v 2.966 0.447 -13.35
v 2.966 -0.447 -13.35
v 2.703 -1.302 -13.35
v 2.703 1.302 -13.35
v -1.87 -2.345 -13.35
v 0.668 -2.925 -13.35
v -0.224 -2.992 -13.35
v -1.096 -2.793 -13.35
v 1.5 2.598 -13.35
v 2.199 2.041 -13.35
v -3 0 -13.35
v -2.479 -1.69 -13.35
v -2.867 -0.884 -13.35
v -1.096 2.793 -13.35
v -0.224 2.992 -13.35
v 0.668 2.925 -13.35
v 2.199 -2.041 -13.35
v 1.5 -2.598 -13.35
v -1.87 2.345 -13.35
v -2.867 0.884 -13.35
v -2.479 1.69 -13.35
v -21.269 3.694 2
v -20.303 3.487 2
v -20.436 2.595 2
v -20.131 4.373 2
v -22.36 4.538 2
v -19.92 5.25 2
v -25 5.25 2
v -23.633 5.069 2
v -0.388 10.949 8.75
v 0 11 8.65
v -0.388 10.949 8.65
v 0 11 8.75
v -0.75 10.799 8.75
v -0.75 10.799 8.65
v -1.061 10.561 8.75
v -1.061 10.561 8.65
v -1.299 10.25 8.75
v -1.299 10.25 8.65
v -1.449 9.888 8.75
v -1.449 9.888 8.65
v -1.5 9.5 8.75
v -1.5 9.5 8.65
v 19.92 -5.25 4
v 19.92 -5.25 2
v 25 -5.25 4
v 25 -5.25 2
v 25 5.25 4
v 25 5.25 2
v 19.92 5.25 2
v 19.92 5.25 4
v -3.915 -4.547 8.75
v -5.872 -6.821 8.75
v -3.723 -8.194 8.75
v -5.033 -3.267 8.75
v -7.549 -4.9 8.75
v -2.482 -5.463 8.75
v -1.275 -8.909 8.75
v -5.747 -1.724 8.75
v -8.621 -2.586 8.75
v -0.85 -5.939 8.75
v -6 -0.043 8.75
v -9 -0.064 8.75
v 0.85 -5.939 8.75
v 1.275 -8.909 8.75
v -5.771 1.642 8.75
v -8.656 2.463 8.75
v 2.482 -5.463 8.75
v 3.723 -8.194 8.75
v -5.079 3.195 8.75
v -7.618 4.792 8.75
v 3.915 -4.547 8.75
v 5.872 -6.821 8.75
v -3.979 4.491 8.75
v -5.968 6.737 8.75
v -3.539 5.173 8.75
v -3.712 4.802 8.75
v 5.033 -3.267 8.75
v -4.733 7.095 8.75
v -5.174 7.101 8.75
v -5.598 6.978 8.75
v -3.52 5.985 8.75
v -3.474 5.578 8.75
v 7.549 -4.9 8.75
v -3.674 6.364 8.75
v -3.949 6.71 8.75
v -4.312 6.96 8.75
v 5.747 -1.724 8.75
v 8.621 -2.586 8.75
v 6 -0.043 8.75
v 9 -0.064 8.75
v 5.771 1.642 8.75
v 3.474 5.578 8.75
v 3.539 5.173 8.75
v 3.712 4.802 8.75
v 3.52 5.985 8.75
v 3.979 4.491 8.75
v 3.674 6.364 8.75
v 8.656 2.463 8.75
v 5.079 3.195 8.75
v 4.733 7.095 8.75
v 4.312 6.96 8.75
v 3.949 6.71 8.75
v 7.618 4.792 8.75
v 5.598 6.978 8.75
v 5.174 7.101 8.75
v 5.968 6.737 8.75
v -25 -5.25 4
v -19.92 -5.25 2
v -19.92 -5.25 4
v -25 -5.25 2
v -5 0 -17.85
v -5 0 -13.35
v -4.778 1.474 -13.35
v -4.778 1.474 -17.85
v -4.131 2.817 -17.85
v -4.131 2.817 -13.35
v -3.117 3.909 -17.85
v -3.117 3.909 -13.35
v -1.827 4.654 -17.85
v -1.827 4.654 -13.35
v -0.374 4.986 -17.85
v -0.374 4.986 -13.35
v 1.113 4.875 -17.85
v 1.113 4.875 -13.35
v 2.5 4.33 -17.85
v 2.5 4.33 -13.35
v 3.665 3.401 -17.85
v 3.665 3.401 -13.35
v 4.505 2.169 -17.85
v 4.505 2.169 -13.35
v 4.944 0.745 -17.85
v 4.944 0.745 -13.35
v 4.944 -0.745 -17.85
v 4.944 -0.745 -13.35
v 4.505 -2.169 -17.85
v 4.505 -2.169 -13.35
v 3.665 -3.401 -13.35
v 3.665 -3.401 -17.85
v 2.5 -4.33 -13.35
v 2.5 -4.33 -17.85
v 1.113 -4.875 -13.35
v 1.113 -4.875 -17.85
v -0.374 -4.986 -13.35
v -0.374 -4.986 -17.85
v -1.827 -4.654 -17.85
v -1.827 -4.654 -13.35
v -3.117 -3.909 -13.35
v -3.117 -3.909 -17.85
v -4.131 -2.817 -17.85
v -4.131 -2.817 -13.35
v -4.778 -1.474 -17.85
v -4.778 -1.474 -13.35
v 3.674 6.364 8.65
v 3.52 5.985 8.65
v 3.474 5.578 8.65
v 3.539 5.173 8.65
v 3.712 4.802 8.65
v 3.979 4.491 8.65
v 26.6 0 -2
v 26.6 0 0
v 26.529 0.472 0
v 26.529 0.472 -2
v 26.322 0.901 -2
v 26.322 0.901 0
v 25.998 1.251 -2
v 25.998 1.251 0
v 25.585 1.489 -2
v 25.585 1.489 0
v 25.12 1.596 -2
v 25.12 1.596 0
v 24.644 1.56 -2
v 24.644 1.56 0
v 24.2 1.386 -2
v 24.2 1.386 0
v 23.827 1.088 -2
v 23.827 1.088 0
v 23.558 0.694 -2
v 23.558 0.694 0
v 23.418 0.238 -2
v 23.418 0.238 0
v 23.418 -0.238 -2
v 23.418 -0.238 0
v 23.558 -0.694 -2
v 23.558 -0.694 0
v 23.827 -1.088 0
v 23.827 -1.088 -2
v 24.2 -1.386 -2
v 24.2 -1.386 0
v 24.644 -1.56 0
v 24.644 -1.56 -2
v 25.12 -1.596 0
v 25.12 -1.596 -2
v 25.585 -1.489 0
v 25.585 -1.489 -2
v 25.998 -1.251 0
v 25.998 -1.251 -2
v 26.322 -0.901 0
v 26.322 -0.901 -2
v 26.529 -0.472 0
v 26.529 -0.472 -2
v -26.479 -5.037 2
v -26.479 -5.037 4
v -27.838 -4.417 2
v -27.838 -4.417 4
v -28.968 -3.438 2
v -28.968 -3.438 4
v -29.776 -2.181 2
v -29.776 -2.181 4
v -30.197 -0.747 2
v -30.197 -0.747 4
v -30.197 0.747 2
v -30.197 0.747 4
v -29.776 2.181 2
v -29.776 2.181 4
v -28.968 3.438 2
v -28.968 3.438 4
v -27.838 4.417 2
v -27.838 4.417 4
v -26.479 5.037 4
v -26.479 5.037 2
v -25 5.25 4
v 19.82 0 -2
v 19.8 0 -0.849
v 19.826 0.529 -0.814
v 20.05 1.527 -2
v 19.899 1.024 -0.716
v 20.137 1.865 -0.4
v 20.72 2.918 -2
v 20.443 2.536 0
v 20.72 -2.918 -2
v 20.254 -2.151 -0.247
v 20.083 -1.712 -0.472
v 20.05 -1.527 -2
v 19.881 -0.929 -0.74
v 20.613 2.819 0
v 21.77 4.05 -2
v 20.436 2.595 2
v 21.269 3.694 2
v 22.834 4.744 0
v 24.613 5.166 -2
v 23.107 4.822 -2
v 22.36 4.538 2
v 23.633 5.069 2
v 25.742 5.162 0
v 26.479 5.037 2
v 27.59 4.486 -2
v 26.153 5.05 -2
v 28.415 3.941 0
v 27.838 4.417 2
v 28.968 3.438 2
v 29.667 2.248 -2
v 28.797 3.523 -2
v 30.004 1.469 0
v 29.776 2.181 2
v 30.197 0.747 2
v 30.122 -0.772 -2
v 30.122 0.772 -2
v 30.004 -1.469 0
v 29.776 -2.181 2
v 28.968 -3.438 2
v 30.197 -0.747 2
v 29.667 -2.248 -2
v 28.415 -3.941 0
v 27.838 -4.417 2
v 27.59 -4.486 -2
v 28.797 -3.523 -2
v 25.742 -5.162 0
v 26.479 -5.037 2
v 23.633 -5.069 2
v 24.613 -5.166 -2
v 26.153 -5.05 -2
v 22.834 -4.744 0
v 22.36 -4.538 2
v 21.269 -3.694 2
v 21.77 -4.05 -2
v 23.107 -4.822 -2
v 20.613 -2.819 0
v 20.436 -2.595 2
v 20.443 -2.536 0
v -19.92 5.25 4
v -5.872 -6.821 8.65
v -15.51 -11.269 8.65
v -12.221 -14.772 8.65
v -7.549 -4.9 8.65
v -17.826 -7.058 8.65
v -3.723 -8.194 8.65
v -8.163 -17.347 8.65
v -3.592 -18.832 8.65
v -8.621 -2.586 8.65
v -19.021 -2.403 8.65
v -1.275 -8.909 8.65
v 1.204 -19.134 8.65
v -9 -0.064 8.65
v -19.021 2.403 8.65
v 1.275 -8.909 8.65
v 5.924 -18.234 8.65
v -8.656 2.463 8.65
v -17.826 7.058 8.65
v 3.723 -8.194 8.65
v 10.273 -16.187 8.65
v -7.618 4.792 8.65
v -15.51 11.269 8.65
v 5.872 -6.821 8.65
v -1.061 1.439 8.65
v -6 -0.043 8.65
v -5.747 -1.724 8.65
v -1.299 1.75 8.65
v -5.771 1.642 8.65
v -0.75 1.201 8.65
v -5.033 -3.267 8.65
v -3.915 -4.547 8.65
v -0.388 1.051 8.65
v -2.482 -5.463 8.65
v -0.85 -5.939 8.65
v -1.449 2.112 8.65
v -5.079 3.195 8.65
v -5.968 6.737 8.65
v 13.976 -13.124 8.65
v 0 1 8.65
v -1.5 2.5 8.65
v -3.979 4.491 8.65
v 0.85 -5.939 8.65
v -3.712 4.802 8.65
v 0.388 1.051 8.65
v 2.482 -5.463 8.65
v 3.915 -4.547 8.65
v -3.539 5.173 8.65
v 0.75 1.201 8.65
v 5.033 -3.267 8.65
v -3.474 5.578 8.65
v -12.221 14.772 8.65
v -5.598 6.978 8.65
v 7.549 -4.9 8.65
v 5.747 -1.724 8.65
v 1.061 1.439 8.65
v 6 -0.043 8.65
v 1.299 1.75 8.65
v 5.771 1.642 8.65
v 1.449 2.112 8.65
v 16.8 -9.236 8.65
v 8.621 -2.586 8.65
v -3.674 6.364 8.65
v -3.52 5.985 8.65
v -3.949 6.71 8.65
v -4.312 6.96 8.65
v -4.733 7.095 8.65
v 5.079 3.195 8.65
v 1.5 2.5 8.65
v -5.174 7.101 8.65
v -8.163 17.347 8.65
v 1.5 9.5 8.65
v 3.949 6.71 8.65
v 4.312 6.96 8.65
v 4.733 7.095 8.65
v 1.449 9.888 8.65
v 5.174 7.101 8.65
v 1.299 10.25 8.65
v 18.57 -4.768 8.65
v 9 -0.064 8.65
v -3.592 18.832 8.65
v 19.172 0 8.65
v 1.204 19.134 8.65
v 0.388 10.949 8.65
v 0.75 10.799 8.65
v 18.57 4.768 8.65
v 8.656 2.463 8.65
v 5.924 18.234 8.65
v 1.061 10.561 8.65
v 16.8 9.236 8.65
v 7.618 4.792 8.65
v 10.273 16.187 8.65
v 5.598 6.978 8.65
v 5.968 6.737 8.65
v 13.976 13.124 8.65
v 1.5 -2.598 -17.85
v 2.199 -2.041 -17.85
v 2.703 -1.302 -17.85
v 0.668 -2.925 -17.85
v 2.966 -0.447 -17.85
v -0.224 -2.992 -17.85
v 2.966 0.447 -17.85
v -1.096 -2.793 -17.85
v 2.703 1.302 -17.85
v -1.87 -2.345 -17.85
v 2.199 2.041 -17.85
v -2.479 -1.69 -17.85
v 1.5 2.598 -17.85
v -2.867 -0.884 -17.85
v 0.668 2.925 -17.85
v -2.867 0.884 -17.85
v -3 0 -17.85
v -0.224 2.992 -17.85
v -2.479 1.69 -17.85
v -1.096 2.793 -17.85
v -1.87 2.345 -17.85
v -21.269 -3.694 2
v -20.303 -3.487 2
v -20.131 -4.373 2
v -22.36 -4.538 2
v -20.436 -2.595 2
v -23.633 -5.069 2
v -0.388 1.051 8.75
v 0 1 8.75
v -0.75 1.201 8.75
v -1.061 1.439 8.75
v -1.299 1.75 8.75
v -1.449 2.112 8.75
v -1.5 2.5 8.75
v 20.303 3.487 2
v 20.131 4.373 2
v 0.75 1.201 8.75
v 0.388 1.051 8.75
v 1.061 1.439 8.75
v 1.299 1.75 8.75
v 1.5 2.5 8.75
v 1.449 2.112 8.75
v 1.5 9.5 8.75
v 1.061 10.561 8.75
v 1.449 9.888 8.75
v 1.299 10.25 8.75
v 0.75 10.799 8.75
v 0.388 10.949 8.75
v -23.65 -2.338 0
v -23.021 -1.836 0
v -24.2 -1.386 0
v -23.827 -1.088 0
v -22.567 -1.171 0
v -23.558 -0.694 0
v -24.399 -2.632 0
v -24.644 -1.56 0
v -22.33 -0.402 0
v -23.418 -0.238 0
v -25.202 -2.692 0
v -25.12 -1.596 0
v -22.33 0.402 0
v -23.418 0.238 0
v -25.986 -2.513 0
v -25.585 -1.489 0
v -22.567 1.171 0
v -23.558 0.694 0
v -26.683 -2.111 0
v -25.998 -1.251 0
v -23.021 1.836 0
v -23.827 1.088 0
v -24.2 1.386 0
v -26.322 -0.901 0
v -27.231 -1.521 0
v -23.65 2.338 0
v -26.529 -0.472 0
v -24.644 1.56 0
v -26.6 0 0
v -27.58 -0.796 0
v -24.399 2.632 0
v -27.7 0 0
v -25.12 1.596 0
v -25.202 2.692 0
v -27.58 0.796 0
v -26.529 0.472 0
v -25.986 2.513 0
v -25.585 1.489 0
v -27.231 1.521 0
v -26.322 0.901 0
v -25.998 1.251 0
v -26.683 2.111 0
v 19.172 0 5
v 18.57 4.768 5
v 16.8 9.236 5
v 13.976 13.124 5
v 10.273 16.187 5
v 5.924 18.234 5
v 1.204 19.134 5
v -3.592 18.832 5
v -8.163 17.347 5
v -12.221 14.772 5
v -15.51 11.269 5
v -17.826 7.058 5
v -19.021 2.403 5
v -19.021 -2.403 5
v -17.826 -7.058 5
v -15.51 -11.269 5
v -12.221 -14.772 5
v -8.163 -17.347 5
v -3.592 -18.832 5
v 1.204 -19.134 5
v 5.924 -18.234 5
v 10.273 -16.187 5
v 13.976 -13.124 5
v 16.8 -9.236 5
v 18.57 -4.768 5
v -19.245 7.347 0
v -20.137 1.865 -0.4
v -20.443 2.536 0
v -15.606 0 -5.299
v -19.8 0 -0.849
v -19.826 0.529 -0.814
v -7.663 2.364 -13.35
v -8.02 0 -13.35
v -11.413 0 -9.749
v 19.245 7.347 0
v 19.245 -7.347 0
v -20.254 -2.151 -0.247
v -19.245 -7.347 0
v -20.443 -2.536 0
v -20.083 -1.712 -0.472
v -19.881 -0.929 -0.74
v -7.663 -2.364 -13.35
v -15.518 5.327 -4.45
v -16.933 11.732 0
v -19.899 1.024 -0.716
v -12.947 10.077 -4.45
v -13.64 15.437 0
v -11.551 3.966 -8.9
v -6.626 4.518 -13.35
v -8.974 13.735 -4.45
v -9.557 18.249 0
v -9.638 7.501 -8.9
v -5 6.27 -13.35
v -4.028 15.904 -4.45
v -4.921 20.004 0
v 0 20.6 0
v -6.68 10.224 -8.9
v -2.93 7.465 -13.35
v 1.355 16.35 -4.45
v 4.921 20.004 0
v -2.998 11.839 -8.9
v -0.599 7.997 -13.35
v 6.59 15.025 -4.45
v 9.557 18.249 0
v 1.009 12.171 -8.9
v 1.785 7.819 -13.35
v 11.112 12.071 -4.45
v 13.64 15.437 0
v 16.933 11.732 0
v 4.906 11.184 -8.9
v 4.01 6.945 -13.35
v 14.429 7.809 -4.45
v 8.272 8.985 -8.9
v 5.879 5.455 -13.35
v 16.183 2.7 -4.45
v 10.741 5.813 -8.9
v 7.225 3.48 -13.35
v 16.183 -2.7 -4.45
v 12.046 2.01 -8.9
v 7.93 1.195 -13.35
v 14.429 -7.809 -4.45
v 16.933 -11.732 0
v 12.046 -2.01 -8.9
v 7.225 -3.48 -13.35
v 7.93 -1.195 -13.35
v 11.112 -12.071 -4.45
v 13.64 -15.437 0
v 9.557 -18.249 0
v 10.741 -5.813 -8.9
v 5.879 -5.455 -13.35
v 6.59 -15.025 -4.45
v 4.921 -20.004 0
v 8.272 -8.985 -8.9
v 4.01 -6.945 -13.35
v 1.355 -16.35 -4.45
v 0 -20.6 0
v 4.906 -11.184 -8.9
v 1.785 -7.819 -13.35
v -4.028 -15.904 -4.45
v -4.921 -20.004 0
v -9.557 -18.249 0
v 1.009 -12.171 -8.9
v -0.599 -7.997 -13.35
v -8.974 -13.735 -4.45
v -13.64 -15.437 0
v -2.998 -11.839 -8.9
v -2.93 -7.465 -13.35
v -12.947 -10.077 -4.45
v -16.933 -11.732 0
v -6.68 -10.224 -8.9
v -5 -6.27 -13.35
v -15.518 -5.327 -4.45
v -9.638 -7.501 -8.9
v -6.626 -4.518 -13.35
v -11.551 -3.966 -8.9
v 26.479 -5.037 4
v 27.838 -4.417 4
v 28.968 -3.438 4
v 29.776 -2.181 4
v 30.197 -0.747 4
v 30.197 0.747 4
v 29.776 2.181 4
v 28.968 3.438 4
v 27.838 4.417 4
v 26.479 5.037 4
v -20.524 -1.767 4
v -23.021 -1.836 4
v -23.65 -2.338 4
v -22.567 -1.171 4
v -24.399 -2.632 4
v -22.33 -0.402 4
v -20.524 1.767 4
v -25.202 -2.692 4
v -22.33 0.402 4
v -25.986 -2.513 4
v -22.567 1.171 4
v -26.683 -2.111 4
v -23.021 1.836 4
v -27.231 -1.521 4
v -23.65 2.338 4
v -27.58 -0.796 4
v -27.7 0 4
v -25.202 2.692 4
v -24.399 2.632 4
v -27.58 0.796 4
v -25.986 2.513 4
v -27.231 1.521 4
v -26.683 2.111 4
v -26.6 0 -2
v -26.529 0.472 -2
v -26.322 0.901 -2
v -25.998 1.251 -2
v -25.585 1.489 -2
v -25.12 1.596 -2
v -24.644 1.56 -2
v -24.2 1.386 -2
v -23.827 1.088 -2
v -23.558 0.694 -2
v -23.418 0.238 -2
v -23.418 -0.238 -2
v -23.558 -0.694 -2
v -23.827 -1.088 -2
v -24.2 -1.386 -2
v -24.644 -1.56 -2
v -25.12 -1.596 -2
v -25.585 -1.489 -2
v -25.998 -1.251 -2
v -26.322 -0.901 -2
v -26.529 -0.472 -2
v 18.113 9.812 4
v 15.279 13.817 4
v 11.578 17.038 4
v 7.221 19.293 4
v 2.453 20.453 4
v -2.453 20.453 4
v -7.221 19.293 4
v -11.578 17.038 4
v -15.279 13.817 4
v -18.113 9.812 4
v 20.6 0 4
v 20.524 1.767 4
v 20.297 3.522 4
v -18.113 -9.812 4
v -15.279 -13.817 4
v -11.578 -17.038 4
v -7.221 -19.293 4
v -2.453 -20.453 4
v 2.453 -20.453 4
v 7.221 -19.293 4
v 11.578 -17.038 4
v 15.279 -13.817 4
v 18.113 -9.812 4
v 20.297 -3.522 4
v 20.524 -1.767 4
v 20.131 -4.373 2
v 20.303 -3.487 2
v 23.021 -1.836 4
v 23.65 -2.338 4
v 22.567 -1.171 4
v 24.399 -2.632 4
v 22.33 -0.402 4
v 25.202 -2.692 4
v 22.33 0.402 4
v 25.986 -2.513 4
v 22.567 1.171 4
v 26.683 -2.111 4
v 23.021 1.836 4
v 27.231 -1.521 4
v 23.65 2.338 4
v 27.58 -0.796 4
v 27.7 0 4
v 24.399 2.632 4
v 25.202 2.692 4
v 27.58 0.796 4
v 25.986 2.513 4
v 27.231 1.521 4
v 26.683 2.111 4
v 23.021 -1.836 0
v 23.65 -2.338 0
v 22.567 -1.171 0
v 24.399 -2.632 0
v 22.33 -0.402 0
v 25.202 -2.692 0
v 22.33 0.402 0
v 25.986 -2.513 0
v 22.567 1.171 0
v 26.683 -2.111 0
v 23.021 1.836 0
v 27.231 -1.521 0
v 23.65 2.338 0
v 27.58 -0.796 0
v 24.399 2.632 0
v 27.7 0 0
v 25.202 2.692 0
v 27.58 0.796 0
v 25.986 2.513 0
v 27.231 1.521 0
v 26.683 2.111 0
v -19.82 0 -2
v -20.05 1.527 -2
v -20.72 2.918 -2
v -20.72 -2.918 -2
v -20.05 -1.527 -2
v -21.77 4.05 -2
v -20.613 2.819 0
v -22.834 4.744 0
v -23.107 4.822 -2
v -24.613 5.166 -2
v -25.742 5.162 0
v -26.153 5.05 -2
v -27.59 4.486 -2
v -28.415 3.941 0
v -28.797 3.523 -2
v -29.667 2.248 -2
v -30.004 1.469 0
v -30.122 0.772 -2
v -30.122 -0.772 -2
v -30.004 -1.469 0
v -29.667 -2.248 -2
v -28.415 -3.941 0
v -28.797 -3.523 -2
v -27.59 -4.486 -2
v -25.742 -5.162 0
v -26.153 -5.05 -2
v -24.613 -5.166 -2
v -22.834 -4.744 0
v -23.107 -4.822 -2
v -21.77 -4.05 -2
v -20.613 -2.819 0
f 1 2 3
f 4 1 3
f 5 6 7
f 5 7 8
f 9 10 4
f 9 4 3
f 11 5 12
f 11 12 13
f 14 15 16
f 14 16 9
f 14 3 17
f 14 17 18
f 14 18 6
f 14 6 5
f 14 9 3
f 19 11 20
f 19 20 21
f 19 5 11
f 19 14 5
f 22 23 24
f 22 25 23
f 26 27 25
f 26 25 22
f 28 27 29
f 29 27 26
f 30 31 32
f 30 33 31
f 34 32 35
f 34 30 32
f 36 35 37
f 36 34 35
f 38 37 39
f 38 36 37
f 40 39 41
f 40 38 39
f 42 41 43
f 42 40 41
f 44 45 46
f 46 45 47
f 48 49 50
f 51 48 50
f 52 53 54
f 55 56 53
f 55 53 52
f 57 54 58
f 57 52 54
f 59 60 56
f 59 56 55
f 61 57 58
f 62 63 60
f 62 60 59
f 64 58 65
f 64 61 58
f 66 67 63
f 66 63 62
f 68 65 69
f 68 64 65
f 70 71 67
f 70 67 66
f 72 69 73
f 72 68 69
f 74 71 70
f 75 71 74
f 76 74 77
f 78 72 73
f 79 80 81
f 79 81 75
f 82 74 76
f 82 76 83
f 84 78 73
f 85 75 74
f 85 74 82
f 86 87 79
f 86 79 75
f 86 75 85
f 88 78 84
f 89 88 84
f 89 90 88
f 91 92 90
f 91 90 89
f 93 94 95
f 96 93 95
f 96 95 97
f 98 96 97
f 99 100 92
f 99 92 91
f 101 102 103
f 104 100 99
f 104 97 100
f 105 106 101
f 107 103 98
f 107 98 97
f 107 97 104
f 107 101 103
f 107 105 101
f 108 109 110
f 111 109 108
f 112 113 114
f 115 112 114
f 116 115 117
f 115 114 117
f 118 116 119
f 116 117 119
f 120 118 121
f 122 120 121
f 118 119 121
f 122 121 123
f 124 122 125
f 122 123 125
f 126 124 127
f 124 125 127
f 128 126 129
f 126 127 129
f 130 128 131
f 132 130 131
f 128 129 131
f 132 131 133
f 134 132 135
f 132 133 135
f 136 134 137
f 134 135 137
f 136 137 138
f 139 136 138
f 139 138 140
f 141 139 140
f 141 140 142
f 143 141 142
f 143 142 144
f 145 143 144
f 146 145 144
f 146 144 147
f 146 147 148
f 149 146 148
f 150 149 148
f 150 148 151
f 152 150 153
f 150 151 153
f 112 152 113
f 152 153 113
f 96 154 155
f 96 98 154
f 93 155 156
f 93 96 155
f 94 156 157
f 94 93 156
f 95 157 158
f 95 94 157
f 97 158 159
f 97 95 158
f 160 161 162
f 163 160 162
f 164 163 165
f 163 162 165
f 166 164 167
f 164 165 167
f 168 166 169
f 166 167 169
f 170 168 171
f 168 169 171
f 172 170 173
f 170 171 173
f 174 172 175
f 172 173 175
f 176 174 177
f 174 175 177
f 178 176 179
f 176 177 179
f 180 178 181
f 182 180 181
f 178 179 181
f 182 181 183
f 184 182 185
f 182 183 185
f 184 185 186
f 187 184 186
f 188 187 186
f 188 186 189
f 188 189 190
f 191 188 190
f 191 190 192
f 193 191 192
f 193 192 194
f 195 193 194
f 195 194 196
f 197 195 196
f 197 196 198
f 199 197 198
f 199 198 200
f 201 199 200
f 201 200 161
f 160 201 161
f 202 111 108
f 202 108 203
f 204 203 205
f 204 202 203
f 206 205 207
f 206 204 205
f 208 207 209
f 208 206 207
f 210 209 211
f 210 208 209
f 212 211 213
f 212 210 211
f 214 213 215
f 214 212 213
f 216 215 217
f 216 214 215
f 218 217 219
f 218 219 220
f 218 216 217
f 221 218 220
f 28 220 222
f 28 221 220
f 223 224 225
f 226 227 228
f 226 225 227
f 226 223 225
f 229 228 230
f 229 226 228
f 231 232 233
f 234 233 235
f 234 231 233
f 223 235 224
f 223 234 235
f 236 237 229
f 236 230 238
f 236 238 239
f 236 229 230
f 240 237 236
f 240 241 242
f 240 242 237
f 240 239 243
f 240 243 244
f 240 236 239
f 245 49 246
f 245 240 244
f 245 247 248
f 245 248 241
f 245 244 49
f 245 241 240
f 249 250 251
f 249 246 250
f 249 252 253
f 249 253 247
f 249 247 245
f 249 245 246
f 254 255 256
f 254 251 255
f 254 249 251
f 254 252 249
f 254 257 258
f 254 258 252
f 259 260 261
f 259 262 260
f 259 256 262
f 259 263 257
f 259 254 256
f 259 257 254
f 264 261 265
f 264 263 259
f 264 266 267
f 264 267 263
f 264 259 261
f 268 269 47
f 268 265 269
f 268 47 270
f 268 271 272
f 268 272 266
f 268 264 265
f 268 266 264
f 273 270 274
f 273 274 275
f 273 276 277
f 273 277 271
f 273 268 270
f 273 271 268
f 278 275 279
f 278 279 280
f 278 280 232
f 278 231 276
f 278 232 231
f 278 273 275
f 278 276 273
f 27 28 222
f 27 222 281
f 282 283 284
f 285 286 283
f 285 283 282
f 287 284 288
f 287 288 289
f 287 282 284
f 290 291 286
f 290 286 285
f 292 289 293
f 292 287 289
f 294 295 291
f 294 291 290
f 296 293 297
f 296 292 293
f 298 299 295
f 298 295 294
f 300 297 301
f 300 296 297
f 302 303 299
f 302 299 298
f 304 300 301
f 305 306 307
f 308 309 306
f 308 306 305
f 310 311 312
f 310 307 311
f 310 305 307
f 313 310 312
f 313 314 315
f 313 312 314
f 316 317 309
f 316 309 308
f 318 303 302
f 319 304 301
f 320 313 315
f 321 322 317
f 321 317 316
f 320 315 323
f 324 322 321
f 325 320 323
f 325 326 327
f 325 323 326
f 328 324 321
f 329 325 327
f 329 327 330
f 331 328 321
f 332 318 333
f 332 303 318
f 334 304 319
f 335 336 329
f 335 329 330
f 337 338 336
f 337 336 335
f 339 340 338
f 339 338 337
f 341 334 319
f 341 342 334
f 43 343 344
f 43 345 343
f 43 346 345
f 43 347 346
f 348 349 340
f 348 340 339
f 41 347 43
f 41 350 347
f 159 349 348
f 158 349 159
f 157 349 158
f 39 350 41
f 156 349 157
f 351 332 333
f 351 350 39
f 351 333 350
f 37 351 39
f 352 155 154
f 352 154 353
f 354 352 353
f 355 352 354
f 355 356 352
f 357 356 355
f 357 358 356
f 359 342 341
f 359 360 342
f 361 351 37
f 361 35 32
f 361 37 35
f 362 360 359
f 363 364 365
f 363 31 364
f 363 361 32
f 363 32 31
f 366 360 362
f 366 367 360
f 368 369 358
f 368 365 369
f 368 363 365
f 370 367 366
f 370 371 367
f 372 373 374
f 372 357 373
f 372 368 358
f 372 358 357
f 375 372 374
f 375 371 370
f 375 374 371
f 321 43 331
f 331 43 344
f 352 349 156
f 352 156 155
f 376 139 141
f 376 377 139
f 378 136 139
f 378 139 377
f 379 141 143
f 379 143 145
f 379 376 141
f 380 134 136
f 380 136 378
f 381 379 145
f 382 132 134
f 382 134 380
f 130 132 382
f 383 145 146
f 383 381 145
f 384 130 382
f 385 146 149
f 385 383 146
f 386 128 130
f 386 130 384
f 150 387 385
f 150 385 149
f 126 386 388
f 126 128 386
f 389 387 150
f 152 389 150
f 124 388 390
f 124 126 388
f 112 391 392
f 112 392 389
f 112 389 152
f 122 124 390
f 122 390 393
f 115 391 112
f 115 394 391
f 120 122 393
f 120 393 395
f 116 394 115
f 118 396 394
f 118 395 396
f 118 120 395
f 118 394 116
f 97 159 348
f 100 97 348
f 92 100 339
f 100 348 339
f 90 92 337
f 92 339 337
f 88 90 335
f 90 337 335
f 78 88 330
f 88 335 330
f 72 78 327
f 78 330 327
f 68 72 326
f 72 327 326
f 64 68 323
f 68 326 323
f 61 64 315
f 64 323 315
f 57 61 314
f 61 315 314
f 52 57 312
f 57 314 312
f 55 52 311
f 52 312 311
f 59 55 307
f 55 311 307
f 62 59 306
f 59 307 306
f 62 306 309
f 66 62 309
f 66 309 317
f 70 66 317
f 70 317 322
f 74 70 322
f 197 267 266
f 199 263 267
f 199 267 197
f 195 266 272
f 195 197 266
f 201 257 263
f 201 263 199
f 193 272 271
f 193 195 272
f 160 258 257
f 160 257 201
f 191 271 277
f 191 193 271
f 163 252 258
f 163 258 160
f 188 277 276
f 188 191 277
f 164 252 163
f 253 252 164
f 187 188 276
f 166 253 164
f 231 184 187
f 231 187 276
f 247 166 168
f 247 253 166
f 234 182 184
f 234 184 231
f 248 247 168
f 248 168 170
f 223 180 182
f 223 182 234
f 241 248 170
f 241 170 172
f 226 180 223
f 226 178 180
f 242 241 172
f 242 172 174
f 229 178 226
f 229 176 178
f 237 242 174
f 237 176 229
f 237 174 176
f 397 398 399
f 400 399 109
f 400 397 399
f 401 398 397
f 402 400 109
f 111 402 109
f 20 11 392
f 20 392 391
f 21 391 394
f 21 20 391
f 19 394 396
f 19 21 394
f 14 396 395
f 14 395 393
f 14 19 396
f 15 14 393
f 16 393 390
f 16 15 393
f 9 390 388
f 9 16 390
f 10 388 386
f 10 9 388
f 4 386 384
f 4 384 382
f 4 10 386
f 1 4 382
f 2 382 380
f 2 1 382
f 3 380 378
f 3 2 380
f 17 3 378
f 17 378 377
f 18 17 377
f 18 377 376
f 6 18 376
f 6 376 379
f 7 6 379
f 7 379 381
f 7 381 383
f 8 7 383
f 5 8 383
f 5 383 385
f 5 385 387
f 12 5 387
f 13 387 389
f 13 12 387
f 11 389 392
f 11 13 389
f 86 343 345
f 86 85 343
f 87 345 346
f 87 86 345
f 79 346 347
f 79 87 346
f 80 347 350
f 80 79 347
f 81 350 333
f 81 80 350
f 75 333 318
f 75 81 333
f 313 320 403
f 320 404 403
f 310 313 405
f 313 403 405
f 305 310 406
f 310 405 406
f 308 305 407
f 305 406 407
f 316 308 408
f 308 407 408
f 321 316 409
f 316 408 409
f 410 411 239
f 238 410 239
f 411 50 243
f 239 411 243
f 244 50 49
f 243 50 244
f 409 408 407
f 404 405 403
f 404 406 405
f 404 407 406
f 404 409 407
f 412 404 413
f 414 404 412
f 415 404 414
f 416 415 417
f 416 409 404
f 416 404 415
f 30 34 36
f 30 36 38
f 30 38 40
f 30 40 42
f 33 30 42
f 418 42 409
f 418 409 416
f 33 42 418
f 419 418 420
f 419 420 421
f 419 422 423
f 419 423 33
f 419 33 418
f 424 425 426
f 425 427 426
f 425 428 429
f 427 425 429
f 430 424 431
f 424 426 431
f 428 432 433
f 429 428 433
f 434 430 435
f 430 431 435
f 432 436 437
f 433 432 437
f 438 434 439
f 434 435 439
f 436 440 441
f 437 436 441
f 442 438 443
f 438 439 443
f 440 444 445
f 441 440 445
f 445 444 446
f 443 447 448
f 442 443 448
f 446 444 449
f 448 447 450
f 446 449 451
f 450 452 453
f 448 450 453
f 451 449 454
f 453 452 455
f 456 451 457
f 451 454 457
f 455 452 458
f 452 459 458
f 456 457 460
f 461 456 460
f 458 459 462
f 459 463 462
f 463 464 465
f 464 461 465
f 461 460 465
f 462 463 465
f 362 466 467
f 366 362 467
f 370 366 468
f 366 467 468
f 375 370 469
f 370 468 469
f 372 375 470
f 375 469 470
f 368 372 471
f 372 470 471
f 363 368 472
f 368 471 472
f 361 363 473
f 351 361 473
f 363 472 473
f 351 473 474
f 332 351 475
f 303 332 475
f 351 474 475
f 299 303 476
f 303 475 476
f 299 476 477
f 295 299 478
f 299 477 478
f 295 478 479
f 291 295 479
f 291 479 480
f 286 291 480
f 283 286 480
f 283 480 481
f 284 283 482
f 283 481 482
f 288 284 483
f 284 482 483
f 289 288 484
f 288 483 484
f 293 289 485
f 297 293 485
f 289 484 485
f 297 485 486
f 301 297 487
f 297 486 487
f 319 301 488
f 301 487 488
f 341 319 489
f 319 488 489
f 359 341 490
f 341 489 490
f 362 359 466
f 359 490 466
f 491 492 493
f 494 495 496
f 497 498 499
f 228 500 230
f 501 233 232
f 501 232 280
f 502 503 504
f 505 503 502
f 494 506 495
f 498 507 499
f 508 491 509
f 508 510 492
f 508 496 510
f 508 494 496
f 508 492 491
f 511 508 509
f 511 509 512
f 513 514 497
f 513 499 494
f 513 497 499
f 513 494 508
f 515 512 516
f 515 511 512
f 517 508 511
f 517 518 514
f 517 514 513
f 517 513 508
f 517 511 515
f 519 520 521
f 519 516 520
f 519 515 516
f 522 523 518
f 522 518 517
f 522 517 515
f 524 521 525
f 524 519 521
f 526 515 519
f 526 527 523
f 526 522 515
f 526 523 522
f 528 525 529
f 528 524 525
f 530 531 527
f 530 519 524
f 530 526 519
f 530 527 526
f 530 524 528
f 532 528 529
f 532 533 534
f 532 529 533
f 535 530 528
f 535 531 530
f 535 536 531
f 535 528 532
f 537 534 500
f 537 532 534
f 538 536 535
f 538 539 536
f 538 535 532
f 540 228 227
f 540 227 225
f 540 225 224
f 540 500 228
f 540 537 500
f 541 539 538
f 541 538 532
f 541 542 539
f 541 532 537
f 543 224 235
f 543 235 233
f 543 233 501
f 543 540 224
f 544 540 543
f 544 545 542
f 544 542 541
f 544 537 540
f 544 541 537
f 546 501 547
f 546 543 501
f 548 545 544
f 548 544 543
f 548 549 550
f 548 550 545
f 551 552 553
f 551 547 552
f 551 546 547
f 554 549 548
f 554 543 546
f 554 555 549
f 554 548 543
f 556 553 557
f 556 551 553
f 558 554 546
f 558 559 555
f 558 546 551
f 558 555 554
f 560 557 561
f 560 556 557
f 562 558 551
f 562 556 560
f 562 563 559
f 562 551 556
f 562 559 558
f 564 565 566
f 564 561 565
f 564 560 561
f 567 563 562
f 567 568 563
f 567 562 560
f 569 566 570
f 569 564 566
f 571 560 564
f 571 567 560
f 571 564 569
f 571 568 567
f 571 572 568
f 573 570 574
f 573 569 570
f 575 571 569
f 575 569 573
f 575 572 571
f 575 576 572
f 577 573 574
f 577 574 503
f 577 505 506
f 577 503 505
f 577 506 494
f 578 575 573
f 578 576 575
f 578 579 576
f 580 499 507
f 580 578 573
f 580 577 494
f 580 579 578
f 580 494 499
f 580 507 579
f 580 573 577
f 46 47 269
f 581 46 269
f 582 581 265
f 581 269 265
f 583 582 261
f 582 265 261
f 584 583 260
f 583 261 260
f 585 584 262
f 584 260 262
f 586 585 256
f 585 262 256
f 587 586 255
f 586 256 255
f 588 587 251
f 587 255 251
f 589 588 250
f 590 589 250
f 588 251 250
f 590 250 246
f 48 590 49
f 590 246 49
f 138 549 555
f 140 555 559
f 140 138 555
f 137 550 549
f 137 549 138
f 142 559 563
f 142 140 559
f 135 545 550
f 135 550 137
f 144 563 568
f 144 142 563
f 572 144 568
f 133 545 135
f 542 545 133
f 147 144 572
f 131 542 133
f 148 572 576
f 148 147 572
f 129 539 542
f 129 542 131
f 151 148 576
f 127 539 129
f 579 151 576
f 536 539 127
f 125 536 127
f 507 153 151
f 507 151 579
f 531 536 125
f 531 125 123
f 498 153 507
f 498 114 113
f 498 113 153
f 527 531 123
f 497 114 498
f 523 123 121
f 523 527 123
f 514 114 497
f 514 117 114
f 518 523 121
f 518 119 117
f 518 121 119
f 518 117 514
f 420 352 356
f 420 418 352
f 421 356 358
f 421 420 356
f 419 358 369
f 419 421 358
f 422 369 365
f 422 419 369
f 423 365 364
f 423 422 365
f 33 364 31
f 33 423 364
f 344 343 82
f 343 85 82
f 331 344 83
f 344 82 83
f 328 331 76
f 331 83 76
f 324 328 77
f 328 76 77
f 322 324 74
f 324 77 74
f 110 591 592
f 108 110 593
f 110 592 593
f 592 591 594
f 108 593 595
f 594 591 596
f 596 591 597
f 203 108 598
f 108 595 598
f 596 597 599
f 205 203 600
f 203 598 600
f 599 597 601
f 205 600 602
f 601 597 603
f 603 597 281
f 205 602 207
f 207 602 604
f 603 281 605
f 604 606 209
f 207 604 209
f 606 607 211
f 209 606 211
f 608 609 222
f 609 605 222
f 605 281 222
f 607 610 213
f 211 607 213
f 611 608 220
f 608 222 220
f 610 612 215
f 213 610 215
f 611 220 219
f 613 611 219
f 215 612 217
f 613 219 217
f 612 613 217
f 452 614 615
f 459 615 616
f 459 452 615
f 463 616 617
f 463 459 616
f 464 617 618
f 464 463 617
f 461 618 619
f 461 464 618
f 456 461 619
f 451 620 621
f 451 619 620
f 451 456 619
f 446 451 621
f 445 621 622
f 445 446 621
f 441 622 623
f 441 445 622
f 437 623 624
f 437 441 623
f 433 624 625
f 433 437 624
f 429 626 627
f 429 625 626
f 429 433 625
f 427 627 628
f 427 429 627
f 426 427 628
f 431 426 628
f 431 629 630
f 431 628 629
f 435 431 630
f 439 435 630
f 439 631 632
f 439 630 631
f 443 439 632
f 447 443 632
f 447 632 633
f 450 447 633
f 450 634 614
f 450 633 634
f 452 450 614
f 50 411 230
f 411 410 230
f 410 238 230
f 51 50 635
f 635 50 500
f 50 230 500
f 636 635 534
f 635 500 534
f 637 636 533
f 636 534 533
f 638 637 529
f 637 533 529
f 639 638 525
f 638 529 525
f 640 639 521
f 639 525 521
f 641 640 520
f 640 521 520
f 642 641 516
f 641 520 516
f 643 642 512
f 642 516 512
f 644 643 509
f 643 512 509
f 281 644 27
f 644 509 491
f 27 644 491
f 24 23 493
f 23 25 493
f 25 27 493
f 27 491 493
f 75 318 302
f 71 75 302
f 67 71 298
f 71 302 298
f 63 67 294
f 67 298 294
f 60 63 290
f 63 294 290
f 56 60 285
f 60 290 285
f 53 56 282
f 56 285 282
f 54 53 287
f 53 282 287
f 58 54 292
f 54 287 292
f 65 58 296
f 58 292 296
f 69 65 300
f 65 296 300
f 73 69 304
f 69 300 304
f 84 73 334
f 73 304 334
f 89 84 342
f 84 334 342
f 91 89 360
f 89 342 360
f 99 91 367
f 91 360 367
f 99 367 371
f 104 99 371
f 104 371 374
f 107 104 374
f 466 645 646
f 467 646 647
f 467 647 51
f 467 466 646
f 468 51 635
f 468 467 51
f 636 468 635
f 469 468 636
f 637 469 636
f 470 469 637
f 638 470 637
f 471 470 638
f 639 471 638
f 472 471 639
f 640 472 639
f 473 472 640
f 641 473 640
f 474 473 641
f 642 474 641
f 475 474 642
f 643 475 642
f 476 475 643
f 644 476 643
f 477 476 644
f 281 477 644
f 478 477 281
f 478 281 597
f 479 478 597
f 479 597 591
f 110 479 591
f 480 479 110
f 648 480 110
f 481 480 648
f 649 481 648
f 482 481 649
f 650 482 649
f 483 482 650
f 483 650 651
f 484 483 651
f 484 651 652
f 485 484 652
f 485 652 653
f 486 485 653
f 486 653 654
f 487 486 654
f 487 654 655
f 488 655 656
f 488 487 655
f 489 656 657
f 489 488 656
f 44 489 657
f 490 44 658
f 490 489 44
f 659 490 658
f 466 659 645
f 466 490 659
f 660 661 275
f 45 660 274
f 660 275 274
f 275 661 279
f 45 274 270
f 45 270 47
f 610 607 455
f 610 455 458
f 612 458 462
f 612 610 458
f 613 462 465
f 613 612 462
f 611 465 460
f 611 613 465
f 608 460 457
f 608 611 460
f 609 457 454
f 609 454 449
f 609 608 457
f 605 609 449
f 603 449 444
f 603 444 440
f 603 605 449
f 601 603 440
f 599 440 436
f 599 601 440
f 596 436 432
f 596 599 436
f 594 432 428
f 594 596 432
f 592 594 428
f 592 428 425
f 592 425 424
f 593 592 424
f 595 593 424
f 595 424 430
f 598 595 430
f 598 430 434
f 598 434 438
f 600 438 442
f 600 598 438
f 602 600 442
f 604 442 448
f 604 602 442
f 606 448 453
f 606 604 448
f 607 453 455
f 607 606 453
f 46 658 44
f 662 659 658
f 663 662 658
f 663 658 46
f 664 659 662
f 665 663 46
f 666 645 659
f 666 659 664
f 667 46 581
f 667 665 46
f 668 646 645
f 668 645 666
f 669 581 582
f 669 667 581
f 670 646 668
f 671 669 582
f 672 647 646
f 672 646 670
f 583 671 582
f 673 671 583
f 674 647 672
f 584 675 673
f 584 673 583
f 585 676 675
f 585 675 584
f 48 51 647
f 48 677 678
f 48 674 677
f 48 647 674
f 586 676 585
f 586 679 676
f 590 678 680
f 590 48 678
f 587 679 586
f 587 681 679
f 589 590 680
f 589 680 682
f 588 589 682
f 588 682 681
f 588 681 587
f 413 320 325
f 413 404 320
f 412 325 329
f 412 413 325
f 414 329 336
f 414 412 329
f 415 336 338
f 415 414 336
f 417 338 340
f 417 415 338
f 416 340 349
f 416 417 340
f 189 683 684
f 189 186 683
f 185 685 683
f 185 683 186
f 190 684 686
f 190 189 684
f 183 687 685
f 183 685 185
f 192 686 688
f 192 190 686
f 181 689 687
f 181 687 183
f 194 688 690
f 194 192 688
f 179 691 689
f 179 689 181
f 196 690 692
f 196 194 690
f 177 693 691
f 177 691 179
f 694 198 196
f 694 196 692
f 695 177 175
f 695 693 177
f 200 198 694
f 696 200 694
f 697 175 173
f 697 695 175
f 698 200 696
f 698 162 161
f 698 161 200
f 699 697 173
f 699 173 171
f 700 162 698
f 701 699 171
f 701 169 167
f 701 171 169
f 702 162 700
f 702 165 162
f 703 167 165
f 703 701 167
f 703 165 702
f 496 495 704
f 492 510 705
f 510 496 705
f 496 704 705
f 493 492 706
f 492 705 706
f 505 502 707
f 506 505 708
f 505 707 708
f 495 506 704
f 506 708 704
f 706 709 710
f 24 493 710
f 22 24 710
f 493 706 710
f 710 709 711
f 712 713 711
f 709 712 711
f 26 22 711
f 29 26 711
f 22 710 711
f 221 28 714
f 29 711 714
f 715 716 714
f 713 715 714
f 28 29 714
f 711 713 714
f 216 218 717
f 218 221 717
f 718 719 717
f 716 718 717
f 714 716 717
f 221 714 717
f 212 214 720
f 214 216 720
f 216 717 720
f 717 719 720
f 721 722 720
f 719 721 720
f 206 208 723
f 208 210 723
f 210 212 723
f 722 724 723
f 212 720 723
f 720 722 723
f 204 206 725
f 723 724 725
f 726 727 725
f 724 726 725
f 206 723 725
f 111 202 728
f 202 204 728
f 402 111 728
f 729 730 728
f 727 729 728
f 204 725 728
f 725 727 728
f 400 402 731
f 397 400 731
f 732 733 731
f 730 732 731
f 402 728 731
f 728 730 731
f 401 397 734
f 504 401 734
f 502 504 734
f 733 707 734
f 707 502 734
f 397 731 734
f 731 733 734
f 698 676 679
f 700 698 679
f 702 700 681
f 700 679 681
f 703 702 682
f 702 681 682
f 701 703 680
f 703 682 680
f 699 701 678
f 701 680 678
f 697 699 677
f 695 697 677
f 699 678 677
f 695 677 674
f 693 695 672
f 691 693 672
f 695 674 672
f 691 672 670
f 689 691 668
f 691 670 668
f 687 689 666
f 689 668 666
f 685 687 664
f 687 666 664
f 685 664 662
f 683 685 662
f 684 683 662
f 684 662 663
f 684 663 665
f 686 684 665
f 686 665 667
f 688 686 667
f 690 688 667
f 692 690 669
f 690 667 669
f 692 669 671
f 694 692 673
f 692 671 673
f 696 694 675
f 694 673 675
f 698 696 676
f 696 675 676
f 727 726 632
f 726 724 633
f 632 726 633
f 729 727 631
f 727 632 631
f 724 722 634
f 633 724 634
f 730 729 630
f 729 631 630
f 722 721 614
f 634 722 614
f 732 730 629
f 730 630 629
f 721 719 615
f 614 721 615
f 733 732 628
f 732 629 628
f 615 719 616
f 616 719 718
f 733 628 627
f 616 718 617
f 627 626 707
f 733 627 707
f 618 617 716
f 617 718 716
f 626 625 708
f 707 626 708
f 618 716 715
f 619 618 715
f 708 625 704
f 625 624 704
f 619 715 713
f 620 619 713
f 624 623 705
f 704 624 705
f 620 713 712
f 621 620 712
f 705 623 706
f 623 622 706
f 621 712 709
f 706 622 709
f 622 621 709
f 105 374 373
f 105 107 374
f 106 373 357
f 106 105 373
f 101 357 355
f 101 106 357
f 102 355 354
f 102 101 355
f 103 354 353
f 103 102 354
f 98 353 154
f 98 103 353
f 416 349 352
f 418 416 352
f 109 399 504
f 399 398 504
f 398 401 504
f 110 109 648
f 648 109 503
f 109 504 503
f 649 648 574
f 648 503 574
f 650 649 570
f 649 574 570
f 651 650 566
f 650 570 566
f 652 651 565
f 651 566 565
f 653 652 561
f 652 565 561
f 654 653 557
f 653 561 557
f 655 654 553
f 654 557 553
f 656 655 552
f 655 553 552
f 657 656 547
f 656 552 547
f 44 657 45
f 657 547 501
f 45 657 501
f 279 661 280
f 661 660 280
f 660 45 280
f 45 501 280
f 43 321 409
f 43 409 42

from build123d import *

# Parameters (mm, degrees)
SKETCH_1_R          = 20.6
EXTRUDE_1_DEPTH     = 4
SKETCH_2_R          = 20.6
EXTRUDE_2_DEPTH     = 1
EXTRUDE_2_TAPER     = 55
SKETCH_3_R          = 19.171851993
EXTRUDE_3_DEPTH     = 3.65
SKETCH_4_R          = 20.6
EXTRUDE_4_DEPTH     = 13.35
EXTRUDE_4_TAPER     = 43.3
SKETCH_5_R          = 5
SKETCH_5_R_2        = 3
EXTRUDE_5_DEPTH     = 4.5
EXTRUDE_START       = 2
EXTRUDE_6_DEPTH     = 2
SKETCH_7_R          = 5.25
EXTRUDE_8_DEPTH     = 4
EXTRUDE_8_TAPER     = 1
SKETCH_8_R          = 2.7
CUT_EXTRUDE_1_DEPTH = 4
SKETCH_9_R          = 1.6
CUT_EXTRUDE_2_DEPTH = 4
SKETCH_10_W         = 3
SKETCH_10_H         = 10
EXTRUDE_9_DEPTH     = 0.1
FILLET_1_R          = 1.5


with BuildPart() as part:
    # 草图1 → 凸台-拉伸1 (new body)
    with BuildSketch(Plane.XY):
        Circle(SKETCH_1_R)
    extrude(amount=EXTRUDE_1_DEPTH)

    # 草图2 → 凸台-拉伸2 (add)
    with BuildSketch(Plane.XY.offset(4)):
        Circle(SKETCH_2_R)
    extrude(amount=EXTRUDE_2_DEPTH, taper=EXTRUDE_2_TAPER)

    # 草图3 → 凸台-拉伸3 (add)
    with BuildSketch(Plane.XY.offset(5)):
        Circle(SKETCH_3_R)
    extrude(amount=EXTRUDE_3_DEPTH)

    # 草图4 → 凸台-拉伸4 (add)
    with BuildSketch(Plane(origin=(0, 0, 0), x_dir=(-1, 0, 0), z_dir=(0, 0, -1))):
        Circle(SKETCH_4_R)
    extrude(amount=EXTRUDE_4_DEPTH, taper=EXTRUDE_4_TAPER)

    # 草图5 → 凸台-拉伸5 (add)
    with BuildSketch(Plane(origin=(0, 0, -13.35), x_dir=(-1, 0, 0), z_dir=(0, 0, -1))):
        Circle(SKETCH_5_R)
        Circle(SKETCH_5_R_2, mode=Mode.SUBTRACT)
    extrude(amount=EXTRUDE_5_DEPTH)

    # 草图6 → 凸台-拉伸6 (add)
    with BuildSketch(Plane.XY.offset(EXTRUDE_START)):
        with BuildLine():
            Line((25, 5.25), (19.069776605, 5.25))
            Line((19.069776605, 5.25), (19.069776605, -5.25))
            Line((19.069776605, -5.25), (25, -5.25))
            ThreePointArc((25, -5.25), (30.25, 0), (25, 5.25))
        make_face()
    extrude_6 = extrude(amount=EXTRUDE_6_DEPTH)

    # 草图7 → 凸台-拉伸8 (add)
    with BuildSketch(Plane(origin=(0, 0, 2), x_dir=(-1, 0, 0), z_dir=(0, 0, -1))):
        with Locations((-25, 0)):
            Circle(SKETCH_7_R)
    extrude_8 = extrude(amount=EXTRUDE_8_DEPTH, taper=EXTRUDE_8_TAPER)

    # 草图8 → 切除-拉伸1 (cut)
    with BuildSketch(Plane.XY.offset(4)):
        with Locations((25, 0)):
            Circle(SKETCH_8_R)
    cut_extrude_1 = extrude(amount=-CUT_EXTRUDE_1_DEPTH, mode=Mode.SUBTRACT)

    # 草图9 → 切除-拉伸2 (cut)
    with BuildSketch(Plane.XY):
        with Locations((25, 0)):
            Circle(SKETCH_9_R)
    cut_extrude_2 = extrude(amount=-CUT_EXTRUDE_2_DEPTH, mode=Mode.SUBTRACT)

    # 镜向1: 凸台-拉伸6, 凸台-拉伸8, 切除-拉伸1, 切除-拉伸2 across plane
    add(extrude_6.mirror(Plane(origin=(0, 0, 0), x_dir=(0, 0, 1), z_dir=(1, 0, 0))))
    add(extrude_8.mirror(Plane(origin=(0, 0, 0), x_dir=(0, 0, 1), z_dir=(1, 0, 0))))
    add(cut_extrude_1.mirror(Plane(origin=(0, 0, 0), x_dir=(0, 0, 1), z_dir=(1, 0, 0))), mode=Mode.SUBTRACT)
    add(cut_extrude_2.mirror(Plane(origin=(0, 0, 0), x_dir=(0, 0, 1), z_dir=(1, 0, 0))), mode=Mode.SUBTRACT)

    # 草图10 → 凸台-拉伸9 (add)
    with BuildSketch(Plane.XY.offset(8.65)):
        with BuildLine():
            Line((-3, 5.196152423), (-4.5, 7.794228634))
            ThreePointArc((-4.5, 7.794228634), (0, -9), (4.5, 7.794228634))
            Line((4.5, 7.794228634), (3, 5.196152423))
            ThreePointArc((3, 5.196152423), (0, -6), (-3, 5.196152423))
        make_face()
        with Locations((0, 6)):
            Rectangle(SKETCH_10_W, SKETCH_10_H)
    extrude(amount=EXTRUDE_9_DEPTH)

    # 圆角1
    fillet_1_edges = [part.edges().sort_by_distance(p)[0] for p in [
        (-3, 5.196152423, 8.7),
        (-4.5, 7.794228634, 8.7),
        (1.5, 1, 8.7),
        (-1.5, 1, 8.7),
        (1.5, 11, 8.7),
        (-1.5, 11, 8.7),
        (4.5, 7.794228634, 8.7),
        (3, 5.196152423, 8.7),
    ]]
    fillet(fillet_1_edges, radius=FILLET_1_R - 0.0001)  # a hair under: the kernel refuses the full size


solid = part.part
